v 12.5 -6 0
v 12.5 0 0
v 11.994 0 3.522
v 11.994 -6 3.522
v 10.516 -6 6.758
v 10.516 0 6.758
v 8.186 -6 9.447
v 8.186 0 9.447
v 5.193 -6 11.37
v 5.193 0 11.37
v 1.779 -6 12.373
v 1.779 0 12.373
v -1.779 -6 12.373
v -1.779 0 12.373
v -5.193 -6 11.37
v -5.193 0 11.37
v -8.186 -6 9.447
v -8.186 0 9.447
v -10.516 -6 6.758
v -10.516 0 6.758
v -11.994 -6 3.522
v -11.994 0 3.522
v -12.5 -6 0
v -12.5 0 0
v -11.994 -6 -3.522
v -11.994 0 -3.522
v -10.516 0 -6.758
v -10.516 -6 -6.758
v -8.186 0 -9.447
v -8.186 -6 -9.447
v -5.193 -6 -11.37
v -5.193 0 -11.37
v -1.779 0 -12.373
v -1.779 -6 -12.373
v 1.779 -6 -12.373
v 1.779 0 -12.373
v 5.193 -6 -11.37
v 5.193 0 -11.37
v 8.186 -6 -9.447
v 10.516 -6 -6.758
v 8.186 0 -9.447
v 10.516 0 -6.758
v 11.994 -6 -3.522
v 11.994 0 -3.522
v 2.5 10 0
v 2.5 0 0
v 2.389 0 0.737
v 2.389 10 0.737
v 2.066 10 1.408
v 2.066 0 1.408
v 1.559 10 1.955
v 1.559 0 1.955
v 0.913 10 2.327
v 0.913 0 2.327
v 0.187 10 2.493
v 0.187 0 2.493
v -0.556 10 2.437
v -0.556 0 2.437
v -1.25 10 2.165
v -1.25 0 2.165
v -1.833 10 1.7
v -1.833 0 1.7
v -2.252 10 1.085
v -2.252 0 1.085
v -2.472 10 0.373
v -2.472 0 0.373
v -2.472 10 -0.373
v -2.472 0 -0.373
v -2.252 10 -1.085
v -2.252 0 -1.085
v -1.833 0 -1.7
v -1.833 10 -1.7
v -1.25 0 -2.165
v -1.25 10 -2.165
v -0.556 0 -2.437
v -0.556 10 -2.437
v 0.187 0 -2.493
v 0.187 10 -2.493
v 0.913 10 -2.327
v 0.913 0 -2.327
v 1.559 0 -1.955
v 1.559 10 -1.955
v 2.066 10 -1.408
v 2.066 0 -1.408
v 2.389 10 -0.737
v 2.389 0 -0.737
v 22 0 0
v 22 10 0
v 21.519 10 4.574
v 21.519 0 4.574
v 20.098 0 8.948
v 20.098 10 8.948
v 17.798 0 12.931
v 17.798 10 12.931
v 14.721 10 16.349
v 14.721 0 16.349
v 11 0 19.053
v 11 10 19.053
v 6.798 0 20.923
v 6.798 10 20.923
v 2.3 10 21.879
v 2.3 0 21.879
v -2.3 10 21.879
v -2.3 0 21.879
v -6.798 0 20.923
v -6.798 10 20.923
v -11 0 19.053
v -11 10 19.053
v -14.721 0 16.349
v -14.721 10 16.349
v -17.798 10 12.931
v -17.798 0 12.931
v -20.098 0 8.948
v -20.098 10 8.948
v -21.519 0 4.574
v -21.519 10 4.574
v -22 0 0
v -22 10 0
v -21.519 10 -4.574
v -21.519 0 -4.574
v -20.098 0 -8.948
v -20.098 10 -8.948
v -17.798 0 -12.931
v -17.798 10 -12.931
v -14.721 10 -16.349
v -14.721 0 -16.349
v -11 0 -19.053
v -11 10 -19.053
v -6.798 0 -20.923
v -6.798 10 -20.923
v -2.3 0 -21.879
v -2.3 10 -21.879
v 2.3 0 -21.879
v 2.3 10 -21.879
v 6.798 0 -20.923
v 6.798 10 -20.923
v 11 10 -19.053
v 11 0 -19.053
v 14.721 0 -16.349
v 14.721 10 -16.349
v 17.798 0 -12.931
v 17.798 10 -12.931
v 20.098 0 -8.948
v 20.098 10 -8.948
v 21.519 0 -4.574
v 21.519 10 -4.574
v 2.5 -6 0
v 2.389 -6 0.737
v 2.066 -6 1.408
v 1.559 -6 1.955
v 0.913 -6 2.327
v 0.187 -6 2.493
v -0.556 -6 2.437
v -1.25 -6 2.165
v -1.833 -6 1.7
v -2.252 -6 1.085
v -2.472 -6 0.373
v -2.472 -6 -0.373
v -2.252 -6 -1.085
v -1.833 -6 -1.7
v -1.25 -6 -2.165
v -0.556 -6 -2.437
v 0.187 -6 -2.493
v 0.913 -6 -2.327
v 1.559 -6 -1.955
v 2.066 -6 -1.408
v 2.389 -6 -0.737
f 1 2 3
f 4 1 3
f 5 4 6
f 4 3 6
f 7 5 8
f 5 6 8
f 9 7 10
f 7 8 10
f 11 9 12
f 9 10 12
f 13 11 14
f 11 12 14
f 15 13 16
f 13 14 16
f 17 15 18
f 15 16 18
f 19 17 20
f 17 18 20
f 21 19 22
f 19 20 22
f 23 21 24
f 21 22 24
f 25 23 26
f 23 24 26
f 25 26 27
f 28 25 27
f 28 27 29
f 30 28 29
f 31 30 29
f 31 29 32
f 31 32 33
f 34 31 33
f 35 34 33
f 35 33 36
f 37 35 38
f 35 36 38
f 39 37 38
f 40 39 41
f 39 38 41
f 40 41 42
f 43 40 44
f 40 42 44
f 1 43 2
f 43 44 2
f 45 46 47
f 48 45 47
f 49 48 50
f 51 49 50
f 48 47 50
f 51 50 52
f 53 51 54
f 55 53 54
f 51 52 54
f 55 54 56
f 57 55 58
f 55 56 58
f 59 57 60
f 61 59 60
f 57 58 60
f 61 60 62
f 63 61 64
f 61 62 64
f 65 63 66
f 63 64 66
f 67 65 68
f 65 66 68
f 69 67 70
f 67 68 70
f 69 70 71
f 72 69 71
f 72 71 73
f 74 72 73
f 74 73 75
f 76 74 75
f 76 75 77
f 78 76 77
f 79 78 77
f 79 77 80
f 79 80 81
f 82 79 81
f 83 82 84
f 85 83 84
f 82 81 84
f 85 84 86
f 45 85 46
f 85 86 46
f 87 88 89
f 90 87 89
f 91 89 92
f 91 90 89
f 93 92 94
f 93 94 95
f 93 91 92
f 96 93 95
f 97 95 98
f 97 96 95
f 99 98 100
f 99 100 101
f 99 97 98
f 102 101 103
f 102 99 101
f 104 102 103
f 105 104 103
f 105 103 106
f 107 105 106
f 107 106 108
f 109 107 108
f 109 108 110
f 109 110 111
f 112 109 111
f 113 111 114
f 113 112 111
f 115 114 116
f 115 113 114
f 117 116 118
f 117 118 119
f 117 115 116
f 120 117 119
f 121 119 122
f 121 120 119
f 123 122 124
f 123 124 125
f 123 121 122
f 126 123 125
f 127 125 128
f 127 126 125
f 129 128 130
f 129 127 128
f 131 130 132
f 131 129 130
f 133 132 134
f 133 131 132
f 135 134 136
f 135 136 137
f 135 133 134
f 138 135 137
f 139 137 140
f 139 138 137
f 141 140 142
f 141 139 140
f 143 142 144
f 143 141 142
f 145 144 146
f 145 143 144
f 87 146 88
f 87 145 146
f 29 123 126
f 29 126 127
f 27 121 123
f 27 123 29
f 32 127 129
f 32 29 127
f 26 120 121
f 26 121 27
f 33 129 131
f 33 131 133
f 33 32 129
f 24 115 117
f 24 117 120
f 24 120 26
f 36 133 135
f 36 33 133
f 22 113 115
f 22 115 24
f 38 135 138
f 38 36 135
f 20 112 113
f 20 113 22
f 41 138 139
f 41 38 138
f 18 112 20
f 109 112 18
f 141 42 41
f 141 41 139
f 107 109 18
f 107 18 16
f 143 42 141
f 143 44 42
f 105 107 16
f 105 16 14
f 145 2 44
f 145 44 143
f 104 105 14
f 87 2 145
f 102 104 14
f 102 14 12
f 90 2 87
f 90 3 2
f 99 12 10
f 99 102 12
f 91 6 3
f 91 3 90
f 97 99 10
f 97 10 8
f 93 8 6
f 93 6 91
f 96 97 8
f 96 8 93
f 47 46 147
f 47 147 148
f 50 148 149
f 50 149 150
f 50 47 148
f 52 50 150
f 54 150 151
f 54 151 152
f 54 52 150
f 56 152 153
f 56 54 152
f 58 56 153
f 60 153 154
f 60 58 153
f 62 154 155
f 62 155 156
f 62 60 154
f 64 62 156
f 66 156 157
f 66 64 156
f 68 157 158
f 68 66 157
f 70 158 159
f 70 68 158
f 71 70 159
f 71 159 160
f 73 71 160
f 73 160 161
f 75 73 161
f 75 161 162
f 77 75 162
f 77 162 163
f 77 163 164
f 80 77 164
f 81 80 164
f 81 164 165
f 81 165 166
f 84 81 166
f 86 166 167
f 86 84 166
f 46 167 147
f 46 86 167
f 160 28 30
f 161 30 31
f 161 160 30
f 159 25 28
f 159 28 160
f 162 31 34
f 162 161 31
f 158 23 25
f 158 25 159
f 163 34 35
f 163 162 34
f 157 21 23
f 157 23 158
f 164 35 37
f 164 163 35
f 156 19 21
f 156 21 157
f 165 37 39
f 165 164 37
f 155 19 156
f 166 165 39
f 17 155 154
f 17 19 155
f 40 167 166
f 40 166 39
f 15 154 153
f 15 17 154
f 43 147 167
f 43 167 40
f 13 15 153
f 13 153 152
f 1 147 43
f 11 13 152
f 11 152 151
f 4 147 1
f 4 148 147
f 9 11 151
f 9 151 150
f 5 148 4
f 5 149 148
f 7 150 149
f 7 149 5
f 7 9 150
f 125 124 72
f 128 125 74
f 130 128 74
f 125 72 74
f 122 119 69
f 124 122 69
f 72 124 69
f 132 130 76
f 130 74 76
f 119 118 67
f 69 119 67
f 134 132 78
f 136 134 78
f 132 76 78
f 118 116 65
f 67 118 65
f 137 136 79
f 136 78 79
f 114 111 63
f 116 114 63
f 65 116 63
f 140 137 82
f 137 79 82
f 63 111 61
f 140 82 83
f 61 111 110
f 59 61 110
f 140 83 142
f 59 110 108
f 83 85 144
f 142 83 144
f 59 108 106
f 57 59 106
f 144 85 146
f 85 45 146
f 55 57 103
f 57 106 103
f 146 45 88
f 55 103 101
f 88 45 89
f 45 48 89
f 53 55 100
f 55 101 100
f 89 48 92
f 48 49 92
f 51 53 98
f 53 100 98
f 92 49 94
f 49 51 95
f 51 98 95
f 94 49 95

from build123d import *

# Parameters (mm, degrees)
F0_R     = 12.5
F0_R_2   = 2.5
F1_DEPTH = 6
F0_R_3   = 22
F2_DEPTH = 10


with BuildPart() as f1:
    # F0 (on Front) → F1 (new body)
    with BuildSketch(Plane.XZ):
        Circle(F0_R)
        Circle(F0_R_2, mode=Mode.SUBTRACT)
    extrude(amount=F1_DEPTH)

    # F0 (on Front) → F2 (join)
    with BuildSketch(Plane.XZ):
        Circle(F0_R_3)
        Circle(F0_R, mode=Mode.SUBTRACT)
        Circle(F0_R)
        Circle(F0_R_2, mode=Mode.SUBTRACT)
    extrude(amount=-F2_DEPTH)


solid = f1.part
